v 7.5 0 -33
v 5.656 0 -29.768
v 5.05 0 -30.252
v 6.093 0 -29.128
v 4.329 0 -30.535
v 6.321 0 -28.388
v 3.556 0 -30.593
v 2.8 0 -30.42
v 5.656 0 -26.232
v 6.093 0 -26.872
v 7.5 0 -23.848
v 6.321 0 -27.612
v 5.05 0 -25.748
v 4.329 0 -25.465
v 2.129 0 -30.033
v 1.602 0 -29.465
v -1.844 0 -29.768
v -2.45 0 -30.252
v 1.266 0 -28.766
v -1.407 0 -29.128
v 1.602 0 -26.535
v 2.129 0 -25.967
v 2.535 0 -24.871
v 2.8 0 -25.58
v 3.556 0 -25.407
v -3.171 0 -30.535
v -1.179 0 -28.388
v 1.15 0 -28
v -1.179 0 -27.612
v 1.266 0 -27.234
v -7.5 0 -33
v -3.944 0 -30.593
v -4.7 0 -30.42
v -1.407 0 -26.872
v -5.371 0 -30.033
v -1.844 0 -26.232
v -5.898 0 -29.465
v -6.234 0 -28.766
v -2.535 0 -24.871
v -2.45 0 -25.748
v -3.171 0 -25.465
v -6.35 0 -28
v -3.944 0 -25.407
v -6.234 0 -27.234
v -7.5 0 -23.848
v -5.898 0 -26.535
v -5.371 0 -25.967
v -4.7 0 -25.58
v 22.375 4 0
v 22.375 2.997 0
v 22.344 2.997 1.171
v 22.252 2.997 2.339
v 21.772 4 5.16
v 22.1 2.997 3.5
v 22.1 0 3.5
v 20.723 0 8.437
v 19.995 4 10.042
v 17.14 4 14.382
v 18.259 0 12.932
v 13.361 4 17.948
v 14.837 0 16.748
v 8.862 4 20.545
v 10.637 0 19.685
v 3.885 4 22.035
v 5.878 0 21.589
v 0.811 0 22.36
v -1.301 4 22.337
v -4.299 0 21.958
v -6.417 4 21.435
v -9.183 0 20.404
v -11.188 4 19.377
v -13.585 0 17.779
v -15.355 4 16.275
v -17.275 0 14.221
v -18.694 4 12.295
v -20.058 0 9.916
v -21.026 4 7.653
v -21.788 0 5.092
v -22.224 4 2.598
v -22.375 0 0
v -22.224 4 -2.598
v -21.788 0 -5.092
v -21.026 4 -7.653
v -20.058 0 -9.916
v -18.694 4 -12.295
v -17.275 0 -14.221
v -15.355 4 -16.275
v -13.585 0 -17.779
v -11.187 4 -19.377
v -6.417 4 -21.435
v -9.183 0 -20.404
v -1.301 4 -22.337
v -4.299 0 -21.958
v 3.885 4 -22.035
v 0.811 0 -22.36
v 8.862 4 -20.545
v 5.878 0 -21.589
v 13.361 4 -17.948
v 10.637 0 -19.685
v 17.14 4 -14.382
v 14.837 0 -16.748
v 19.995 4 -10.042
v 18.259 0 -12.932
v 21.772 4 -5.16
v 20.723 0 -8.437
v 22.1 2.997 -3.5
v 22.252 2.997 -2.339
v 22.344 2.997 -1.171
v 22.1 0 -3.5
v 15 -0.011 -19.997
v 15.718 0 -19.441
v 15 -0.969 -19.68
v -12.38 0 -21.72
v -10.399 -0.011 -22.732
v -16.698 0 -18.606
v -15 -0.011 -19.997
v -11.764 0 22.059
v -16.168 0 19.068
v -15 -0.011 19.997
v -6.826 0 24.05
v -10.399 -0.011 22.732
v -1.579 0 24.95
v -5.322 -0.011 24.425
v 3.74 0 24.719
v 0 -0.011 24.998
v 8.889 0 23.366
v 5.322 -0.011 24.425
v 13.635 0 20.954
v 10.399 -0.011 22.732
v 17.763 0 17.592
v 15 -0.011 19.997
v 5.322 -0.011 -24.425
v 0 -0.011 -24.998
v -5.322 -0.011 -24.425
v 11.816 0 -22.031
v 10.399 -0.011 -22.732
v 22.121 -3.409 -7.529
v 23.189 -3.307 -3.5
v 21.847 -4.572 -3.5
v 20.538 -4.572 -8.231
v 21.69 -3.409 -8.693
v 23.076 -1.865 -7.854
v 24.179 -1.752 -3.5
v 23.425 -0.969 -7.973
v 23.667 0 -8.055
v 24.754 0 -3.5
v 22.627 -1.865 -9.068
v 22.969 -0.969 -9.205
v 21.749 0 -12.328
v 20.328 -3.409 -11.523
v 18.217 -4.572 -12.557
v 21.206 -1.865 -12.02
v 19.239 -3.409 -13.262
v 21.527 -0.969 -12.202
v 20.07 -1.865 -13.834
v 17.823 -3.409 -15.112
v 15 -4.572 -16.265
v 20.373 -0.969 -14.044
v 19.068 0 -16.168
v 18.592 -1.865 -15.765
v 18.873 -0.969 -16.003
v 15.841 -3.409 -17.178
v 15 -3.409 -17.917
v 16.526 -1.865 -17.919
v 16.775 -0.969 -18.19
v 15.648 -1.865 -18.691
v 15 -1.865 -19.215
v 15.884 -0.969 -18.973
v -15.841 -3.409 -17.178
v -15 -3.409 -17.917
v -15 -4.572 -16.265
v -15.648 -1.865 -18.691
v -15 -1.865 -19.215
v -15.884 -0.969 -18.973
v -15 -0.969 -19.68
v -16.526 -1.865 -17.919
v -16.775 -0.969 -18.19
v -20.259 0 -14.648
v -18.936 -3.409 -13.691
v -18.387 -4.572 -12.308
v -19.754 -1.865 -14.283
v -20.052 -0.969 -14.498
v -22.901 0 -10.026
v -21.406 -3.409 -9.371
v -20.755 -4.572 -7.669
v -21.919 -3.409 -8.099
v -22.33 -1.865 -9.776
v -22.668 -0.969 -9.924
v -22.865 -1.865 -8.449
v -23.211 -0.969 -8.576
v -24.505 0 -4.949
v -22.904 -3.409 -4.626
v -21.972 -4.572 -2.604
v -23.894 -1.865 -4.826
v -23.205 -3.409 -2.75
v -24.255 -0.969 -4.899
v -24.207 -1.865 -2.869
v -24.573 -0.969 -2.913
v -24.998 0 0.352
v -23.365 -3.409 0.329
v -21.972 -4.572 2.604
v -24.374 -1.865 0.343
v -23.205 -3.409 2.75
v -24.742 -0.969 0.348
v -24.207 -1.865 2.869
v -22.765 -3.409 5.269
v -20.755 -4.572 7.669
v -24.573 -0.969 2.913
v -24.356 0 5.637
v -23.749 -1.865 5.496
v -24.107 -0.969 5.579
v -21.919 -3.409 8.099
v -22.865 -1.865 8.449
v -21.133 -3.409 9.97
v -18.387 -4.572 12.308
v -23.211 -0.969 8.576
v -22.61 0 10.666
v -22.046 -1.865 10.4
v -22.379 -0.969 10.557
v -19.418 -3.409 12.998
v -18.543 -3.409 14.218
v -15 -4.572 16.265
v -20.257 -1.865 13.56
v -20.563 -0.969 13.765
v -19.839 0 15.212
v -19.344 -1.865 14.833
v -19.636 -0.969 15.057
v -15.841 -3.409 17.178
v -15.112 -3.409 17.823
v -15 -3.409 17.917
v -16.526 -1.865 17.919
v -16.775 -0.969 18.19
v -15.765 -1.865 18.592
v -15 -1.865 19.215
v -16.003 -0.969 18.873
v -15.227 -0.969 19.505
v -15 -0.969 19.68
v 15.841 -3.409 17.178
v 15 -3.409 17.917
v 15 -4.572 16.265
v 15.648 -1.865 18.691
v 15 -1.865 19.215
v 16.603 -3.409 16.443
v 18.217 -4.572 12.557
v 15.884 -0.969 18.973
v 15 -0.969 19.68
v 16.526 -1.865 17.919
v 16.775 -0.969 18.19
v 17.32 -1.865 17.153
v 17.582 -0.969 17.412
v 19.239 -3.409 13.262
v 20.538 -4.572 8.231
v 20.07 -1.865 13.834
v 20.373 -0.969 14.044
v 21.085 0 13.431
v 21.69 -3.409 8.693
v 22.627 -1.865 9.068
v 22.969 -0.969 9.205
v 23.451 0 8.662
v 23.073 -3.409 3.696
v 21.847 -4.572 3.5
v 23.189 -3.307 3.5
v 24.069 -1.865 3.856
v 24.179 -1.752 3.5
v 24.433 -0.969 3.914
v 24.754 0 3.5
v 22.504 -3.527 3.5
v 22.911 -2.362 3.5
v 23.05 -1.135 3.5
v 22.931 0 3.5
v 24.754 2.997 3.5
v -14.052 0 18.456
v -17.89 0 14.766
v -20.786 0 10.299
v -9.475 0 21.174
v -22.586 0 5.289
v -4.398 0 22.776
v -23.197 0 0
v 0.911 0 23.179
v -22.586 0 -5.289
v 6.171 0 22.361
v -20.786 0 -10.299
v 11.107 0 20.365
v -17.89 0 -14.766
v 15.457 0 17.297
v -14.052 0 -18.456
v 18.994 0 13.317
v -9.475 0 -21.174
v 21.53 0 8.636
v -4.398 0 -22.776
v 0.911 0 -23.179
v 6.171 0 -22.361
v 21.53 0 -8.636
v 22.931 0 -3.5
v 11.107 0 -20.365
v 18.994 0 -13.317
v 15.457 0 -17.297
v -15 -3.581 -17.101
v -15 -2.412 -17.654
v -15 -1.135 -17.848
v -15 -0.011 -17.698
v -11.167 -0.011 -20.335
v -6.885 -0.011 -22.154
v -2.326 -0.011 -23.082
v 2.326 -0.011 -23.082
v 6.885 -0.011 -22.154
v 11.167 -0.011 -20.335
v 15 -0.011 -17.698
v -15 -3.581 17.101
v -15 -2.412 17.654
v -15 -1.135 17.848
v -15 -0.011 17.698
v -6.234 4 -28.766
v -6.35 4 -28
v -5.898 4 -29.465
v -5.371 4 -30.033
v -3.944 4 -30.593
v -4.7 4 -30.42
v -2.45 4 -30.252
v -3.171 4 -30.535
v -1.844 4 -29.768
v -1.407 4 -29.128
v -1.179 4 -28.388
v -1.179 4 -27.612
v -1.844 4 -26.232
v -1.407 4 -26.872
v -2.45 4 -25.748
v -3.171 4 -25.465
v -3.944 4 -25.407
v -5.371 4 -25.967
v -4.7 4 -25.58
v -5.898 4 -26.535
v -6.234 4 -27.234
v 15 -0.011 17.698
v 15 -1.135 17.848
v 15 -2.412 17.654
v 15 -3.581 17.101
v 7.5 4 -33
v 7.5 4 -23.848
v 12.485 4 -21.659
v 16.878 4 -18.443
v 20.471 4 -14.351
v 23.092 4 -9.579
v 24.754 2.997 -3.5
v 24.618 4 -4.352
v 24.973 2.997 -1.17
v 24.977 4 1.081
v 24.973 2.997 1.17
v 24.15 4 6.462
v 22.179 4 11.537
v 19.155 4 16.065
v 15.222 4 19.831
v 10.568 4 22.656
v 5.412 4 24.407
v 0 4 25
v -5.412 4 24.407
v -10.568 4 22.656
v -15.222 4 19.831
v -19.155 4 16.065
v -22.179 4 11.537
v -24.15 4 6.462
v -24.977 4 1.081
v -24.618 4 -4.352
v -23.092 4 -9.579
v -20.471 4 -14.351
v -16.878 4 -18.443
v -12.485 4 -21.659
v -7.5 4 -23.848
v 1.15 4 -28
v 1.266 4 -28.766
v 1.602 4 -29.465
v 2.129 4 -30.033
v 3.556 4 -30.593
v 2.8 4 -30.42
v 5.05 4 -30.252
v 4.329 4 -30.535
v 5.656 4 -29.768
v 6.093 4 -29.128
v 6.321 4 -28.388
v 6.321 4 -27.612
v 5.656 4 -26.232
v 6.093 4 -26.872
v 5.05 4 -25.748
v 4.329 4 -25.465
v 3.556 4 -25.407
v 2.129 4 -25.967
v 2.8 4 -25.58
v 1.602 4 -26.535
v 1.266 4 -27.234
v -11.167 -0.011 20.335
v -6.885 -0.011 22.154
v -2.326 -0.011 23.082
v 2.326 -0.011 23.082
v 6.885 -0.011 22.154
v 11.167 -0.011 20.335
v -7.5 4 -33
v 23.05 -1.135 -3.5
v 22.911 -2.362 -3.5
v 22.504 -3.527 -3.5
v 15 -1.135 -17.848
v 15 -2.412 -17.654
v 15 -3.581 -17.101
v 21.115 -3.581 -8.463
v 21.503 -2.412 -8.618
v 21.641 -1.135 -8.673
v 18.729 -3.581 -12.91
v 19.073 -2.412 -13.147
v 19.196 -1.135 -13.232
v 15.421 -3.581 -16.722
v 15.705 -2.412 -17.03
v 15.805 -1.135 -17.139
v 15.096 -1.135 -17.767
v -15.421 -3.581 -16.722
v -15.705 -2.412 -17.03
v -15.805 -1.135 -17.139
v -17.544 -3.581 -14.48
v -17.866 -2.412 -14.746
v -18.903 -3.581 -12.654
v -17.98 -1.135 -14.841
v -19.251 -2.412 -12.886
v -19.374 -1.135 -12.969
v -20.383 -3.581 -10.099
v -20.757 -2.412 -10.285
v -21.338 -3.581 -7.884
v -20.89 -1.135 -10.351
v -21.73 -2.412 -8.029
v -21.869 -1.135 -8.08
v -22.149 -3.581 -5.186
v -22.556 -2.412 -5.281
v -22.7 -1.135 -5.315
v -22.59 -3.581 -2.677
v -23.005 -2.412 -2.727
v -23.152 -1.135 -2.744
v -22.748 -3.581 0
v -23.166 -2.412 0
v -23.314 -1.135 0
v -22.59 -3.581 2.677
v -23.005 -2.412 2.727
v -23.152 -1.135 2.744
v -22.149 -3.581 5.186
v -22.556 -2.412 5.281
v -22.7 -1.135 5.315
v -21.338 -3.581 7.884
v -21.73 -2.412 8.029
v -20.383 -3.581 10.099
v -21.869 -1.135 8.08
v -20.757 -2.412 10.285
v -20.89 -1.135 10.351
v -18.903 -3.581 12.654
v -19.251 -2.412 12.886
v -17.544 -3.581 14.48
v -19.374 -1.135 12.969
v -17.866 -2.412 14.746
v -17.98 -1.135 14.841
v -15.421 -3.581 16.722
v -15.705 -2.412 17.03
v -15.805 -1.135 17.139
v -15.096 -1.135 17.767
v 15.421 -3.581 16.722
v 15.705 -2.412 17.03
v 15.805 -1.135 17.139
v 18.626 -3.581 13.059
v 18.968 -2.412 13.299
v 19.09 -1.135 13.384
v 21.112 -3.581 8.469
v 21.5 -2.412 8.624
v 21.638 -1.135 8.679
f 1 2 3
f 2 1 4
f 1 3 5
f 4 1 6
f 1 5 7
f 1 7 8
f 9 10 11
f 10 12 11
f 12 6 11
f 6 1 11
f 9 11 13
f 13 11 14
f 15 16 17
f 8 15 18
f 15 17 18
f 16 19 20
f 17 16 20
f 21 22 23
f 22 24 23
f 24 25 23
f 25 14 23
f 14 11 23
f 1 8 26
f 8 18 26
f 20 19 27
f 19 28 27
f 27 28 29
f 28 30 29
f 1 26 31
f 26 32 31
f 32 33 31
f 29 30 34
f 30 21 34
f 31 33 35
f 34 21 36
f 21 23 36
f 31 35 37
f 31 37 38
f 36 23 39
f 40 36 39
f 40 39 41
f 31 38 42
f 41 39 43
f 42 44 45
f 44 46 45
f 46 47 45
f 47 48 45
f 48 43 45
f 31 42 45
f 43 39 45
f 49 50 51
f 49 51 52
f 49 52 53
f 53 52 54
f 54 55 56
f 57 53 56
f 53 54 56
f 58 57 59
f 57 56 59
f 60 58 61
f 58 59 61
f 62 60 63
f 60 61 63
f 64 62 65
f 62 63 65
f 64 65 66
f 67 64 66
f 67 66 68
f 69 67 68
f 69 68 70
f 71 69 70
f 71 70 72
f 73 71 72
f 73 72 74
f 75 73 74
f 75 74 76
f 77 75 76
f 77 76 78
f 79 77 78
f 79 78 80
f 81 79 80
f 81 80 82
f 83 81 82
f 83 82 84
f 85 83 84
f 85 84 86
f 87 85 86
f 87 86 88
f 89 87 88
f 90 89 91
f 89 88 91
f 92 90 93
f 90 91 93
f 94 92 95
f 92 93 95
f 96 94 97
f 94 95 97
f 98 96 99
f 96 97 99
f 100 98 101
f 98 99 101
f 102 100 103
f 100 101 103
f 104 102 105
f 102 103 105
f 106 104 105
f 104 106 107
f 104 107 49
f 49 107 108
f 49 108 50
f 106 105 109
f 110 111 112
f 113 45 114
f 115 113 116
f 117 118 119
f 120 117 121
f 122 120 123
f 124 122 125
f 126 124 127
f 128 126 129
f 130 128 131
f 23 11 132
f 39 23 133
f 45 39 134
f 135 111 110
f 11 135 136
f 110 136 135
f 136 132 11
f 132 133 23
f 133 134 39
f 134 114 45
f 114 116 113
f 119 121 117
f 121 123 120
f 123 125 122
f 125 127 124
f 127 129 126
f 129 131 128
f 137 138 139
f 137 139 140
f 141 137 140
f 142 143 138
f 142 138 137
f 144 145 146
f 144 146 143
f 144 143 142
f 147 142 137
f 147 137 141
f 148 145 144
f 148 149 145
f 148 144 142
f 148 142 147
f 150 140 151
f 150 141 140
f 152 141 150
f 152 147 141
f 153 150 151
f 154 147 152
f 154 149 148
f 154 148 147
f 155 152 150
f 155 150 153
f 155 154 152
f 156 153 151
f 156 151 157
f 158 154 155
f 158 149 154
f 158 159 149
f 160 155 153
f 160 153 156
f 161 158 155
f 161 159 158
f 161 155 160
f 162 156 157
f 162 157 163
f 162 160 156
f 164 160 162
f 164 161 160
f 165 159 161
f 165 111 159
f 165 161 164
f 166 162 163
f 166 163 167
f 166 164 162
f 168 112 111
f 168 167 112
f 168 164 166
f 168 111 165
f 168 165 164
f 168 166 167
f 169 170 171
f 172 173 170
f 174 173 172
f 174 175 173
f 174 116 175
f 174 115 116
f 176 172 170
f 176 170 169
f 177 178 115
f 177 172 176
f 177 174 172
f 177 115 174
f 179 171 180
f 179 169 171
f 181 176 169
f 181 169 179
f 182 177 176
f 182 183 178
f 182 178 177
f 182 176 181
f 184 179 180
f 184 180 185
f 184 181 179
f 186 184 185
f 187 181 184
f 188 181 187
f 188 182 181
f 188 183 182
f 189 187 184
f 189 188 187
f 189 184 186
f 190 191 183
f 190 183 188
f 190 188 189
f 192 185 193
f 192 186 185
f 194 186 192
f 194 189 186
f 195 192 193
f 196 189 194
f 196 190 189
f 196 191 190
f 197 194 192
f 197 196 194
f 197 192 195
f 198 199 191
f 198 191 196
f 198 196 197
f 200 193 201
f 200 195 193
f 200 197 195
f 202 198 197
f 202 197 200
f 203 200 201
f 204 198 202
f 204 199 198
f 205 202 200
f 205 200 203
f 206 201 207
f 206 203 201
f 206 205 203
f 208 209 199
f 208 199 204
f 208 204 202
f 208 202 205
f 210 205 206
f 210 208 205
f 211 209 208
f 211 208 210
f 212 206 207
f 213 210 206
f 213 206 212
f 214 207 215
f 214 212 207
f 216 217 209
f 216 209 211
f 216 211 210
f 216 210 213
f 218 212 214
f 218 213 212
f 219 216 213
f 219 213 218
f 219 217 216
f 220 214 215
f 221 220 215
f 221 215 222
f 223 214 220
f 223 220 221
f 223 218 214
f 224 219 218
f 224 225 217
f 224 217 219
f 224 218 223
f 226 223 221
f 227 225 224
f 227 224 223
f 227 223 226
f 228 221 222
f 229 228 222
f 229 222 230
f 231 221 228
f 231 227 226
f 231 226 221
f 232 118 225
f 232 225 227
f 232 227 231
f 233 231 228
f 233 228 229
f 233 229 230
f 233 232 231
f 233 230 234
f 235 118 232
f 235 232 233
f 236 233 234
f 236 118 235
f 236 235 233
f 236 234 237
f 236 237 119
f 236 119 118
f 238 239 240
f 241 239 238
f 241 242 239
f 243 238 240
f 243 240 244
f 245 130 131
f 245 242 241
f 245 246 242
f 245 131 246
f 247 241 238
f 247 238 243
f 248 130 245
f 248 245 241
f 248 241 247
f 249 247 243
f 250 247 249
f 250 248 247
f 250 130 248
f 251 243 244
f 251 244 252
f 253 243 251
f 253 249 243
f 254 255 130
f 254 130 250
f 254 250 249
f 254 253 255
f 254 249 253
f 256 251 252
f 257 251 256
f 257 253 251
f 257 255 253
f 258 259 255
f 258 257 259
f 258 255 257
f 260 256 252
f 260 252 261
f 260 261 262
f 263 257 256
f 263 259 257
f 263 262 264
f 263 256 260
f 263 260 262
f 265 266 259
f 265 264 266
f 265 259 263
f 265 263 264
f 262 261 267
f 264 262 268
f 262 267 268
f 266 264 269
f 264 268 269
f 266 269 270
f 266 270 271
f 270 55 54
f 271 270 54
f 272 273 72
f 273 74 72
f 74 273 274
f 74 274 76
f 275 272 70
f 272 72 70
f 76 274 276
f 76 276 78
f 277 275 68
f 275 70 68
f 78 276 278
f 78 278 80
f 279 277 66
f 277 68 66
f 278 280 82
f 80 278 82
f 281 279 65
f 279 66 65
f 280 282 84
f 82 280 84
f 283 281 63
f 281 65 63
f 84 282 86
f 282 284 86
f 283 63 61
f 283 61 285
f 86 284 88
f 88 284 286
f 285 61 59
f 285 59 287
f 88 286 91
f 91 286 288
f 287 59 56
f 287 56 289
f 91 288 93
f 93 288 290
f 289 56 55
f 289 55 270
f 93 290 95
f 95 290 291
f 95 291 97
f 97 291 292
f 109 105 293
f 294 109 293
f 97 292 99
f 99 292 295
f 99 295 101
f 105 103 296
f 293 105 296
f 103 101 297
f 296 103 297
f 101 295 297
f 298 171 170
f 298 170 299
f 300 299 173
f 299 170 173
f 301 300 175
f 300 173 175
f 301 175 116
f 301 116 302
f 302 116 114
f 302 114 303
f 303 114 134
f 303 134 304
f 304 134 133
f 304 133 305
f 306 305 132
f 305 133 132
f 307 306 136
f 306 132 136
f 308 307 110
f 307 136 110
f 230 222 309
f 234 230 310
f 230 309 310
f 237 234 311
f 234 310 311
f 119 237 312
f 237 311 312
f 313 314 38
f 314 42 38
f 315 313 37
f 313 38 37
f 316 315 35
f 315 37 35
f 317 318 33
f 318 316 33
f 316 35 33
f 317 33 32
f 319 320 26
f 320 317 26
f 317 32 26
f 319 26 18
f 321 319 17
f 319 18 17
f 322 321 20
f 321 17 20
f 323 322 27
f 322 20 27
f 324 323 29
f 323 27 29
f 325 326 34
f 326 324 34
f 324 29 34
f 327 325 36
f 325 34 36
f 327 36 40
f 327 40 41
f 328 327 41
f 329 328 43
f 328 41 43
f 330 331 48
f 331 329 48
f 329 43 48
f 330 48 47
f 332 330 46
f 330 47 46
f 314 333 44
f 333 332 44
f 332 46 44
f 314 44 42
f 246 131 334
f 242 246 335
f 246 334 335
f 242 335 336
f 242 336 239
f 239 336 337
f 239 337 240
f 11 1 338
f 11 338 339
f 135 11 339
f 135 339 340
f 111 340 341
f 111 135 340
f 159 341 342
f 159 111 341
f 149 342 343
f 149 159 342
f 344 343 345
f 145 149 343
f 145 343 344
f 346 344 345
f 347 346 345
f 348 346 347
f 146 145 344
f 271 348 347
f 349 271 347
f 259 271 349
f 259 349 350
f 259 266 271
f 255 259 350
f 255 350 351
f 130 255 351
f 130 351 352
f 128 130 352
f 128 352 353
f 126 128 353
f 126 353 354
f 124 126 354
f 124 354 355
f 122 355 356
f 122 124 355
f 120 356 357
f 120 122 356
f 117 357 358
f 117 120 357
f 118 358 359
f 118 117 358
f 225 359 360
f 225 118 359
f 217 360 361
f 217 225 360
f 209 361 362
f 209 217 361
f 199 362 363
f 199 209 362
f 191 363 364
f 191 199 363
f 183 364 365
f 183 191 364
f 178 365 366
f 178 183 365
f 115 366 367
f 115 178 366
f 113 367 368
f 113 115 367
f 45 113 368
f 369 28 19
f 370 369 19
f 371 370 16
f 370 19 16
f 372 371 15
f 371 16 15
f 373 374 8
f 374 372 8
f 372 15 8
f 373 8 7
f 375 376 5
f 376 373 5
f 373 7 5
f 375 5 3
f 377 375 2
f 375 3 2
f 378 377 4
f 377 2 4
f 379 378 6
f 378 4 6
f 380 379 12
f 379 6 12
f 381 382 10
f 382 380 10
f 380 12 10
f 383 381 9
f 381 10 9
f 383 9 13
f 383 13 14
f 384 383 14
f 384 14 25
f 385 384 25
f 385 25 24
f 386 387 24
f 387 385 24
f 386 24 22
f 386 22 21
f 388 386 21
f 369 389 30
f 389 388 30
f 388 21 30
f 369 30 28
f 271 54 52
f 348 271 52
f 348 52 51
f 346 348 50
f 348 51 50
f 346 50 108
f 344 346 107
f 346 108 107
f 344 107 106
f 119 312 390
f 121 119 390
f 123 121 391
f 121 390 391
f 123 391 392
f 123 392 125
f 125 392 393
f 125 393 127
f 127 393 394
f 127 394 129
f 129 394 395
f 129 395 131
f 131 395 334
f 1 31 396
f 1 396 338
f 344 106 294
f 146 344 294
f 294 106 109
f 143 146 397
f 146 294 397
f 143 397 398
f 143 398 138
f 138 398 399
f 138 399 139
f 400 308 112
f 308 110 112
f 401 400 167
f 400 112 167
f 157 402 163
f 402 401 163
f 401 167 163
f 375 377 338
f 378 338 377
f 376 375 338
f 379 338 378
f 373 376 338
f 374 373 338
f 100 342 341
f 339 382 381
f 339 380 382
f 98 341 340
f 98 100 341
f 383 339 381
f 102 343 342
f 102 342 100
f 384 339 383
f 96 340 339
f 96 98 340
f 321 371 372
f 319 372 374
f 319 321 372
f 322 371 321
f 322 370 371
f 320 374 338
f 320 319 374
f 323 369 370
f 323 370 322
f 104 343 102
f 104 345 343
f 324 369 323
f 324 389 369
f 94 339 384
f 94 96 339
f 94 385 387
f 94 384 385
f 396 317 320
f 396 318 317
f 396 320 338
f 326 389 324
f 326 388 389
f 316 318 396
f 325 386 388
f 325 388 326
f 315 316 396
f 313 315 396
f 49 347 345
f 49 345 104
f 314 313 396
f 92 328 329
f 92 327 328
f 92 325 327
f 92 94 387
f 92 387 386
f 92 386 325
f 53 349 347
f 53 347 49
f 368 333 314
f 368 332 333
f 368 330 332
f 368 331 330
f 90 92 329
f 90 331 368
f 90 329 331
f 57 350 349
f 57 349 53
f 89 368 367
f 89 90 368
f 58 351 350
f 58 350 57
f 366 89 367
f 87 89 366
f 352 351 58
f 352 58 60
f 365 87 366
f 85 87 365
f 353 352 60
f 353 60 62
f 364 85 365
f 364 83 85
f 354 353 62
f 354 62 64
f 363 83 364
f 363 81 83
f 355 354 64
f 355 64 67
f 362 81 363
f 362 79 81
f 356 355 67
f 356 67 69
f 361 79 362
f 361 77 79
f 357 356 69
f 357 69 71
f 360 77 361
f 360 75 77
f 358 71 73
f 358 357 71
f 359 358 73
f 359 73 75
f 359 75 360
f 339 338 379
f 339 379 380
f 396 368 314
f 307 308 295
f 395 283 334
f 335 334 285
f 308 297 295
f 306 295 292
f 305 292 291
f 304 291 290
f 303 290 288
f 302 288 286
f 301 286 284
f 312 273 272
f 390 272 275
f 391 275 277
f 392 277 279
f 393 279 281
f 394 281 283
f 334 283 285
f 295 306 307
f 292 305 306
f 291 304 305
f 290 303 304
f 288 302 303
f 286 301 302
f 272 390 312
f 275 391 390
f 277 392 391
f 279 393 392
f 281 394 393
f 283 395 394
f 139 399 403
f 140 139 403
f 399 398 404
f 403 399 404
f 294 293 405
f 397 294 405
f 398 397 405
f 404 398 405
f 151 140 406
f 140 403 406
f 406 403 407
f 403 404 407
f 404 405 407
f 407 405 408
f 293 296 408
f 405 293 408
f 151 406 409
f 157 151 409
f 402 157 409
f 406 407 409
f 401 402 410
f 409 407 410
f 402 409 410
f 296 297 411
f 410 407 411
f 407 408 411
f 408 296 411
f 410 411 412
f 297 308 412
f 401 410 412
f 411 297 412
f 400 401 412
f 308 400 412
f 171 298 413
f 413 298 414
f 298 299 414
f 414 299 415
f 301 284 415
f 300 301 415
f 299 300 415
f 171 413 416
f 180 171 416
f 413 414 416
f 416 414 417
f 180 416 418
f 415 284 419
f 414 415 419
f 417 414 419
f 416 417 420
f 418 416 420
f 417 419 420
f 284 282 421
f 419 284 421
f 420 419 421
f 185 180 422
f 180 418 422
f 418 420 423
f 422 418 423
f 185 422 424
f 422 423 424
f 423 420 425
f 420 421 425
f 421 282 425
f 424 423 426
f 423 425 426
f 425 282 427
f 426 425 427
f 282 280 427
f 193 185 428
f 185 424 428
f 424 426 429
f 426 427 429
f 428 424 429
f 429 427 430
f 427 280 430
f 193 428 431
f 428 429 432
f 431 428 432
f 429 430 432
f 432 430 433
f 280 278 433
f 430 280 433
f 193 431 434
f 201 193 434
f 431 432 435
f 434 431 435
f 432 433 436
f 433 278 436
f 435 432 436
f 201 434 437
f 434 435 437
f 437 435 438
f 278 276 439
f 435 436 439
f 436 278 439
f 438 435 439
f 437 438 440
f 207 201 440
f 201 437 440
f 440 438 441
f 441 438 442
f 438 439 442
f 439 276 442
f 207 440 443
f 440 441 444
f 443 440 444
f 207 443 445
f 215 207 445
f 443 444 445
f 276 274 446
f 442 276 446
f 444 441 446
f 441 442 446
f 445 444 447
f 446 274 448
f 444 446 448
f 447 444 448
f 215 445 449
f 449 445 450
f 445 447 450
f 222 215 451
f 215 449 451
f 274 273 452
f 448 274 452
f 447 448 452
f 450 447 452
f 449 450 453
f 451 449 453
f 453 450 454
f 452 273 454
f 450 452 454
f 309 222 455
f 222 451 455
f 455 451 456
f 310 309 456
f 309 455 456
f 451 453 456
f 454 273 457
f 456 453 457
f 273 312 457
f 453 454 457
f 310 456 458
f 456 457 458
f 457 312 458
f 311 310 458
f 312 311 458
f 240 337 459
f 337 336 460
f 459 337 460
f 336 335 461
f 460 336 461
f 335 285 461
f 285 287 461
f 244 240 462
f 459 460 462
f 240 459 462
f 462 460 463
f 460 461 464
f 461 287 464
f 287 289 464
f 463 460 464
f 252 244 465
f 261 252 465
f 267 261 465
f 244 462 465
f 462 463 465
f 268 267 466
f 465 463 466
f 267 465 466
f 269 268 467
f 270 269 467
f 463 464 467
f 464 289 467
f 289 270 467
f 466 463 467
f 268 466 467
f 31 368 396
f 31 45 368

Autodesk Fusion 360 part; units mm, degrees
sketch "Sketch1" plane through (0, 0, 0) normal (0, 1, 0) x (1, 0, 0)
  circle A0 centre (0, 0) radius 22.375
  circle A1 centre (0, 0) radius 25
  dimension "d1" = 44.75
  dimension "d2" = 50
sketch "Sketch2" plane through (0, 0, 0) normal (0, 0, 1) x (1, 0, 0)
extrude "Extrude1" add sketch "Sketch1" along normal blind 3
sketch "Sketch3" plane through (0, 0, 0) normal (0, 0, 1) x (1, 0, 0)
  line L0 (18, 0) -> (18, -6)
  line L1 (25, 0) -> (25, -6)
  line L2 (18, -6) -> (25, -6)
  line L3 (18, 0) -> (25, 0)
  line L4 (18, -6) -> (25, -6)
  circle A0 centre (17.7502, -1.1354) radius 5.5639
  circle A1 centre (17.685, 1.409) radius 7.4494
  dimension "d9" = 18
  dimension "d10" = 25
  dimension "d11" = 6
  dimension "d12" = 6
sketch "Sketch4" plane through (0, 0, 0) normal (0, 0, 1) x (1, 0, 0)
sketch "Sketch5" plane through (0, 0, 0) normal (0, 0, 1) x (1, 0, 0)
  line L0 (-15, -0.0108) -> (15, -0.0108)
  line L1 (15, -0.0108) -> (15, -9.5655)
  line L2 (15, -9.5655) -> (-15, -9.5655)
  line L3 (-15, -9.5655) -> (-15, -0.0108)
  dimension "d14" = 30
  dimension "d15" = 15
sketch "Sketch6" plane through (0, 3, 0) normal (0, 1, 0) x (-1, 0, 0)
  circle A0 centre (0, 0) radius 22.375
  circle A1 centre (0, 0) radius 25
sketch "Sketch7" plane through (0, 0, 0) normal (1, 0, 0) x (0, 0, -1)
  line L0 (-3.5, 2.9971) -> (3.5, 2.9971)
  line L1 (3.5, 2.9971) -> (3.5, -7)
  line L2 (3.5, -7) -> (-3.5, -7)
  line L3 (-3.5, -7) -> (-3.5, 2.9971)
  point P0 (0, 1.409)
  dimension "d20" = 7
  dimension "d26" = 3.5
sketch "Sketch8" plane through (0, 0, 0) normal (0, 0, 1) x (1, 0, 0)
sketch "Sketch9" plane through (0, 3, 0) normal (0, 1, 0) x (-1, 0, 0)
extrude "Extrude4" cut sketch "Sketch7" along normal blind 25
extrude "Extrude5" cut sketch "Sketch5" along normal blind 32 and the other way blind 36
sketch "Sketch10" plane through (0, 3, 0) normal (0, 1, 0) x (-1, 0, 0)
  line L0 (7.5, -33) -> (-7.5, -33)
  line L1 (-7.5, -33) -> (-7.5, -23)
  line L2 (-7.5, -23) -> (7.5, -23)
  line L3 (7.5, -23) -> (7.5, -33)
  circle A0 centre (3.75, -28) radius 2.6
  circle A1 centre (-3.75, -28) radius 2.6
  dimension "d33" = 15
  dimension "d34" = 7.5
  dimension "d35" = 5.2
  dimension "d36" = 5.2
  dimension "d37" = 10
  dimension "d38" = 23
  dimension "d39" = 3.75
  dimension "d40" = 3.75
revolve "Revolve4" add sketch "Sketch3" angle 360 about axis through (0, 1.75, 0) along (0, 1, 0) contours L3 A0 A1 picked at (24.3244, -0.4805)
extrude "Extrude9" cut sketch "Sketch5" along normal blind 42 and the other way blind 47
extrude "Extrude10" cut sketch "Sketch7" along normal blind 53
sketch "Sketch11" plane through (0, 0, 0) normal (0, 0, 1) x (1, 0, 0)
sketch "Sketch12" plane through (0, 0, 0) normal (0, 1, 0) x (1, 0, 0)
extrude "Extrude11" add sketch "Sketch10" against normal blind 3
extrude "Extrude12" add 1 faces at (1.0571, 3, -32.1783) along direction (0, 1, 0) blind 1
sketch "Sketch13" plane through (0, 0, 0) normal (0, 0, 1) x (1, 0, 0)
sketch "Sketch14" plane through (0, 0, 0) normal (1, 0, 0) x (0, 0, -1)
sketch "Sketch15" plane through (7.5, 0, 0) normal (1, 0, 0) x (0, 0, -1)
  line L0 (23.8485, 4) -> (23.8485, 0)
  line L1 (23.8485, 0) -> (33, 0)
  line L2 (33, 0) -> (33, 4)
  line L3 (33, 4) -> (23.8485, 4)
sketch "Sketch16" plane through (0, 0, 0) normal (1, 0, 0) x (0, 0, -1)
equation "d10 = ( 50 / 2 ) * 1 mm"
equation "d39 = ( 7.5 / 2 ) * 1 mm"
